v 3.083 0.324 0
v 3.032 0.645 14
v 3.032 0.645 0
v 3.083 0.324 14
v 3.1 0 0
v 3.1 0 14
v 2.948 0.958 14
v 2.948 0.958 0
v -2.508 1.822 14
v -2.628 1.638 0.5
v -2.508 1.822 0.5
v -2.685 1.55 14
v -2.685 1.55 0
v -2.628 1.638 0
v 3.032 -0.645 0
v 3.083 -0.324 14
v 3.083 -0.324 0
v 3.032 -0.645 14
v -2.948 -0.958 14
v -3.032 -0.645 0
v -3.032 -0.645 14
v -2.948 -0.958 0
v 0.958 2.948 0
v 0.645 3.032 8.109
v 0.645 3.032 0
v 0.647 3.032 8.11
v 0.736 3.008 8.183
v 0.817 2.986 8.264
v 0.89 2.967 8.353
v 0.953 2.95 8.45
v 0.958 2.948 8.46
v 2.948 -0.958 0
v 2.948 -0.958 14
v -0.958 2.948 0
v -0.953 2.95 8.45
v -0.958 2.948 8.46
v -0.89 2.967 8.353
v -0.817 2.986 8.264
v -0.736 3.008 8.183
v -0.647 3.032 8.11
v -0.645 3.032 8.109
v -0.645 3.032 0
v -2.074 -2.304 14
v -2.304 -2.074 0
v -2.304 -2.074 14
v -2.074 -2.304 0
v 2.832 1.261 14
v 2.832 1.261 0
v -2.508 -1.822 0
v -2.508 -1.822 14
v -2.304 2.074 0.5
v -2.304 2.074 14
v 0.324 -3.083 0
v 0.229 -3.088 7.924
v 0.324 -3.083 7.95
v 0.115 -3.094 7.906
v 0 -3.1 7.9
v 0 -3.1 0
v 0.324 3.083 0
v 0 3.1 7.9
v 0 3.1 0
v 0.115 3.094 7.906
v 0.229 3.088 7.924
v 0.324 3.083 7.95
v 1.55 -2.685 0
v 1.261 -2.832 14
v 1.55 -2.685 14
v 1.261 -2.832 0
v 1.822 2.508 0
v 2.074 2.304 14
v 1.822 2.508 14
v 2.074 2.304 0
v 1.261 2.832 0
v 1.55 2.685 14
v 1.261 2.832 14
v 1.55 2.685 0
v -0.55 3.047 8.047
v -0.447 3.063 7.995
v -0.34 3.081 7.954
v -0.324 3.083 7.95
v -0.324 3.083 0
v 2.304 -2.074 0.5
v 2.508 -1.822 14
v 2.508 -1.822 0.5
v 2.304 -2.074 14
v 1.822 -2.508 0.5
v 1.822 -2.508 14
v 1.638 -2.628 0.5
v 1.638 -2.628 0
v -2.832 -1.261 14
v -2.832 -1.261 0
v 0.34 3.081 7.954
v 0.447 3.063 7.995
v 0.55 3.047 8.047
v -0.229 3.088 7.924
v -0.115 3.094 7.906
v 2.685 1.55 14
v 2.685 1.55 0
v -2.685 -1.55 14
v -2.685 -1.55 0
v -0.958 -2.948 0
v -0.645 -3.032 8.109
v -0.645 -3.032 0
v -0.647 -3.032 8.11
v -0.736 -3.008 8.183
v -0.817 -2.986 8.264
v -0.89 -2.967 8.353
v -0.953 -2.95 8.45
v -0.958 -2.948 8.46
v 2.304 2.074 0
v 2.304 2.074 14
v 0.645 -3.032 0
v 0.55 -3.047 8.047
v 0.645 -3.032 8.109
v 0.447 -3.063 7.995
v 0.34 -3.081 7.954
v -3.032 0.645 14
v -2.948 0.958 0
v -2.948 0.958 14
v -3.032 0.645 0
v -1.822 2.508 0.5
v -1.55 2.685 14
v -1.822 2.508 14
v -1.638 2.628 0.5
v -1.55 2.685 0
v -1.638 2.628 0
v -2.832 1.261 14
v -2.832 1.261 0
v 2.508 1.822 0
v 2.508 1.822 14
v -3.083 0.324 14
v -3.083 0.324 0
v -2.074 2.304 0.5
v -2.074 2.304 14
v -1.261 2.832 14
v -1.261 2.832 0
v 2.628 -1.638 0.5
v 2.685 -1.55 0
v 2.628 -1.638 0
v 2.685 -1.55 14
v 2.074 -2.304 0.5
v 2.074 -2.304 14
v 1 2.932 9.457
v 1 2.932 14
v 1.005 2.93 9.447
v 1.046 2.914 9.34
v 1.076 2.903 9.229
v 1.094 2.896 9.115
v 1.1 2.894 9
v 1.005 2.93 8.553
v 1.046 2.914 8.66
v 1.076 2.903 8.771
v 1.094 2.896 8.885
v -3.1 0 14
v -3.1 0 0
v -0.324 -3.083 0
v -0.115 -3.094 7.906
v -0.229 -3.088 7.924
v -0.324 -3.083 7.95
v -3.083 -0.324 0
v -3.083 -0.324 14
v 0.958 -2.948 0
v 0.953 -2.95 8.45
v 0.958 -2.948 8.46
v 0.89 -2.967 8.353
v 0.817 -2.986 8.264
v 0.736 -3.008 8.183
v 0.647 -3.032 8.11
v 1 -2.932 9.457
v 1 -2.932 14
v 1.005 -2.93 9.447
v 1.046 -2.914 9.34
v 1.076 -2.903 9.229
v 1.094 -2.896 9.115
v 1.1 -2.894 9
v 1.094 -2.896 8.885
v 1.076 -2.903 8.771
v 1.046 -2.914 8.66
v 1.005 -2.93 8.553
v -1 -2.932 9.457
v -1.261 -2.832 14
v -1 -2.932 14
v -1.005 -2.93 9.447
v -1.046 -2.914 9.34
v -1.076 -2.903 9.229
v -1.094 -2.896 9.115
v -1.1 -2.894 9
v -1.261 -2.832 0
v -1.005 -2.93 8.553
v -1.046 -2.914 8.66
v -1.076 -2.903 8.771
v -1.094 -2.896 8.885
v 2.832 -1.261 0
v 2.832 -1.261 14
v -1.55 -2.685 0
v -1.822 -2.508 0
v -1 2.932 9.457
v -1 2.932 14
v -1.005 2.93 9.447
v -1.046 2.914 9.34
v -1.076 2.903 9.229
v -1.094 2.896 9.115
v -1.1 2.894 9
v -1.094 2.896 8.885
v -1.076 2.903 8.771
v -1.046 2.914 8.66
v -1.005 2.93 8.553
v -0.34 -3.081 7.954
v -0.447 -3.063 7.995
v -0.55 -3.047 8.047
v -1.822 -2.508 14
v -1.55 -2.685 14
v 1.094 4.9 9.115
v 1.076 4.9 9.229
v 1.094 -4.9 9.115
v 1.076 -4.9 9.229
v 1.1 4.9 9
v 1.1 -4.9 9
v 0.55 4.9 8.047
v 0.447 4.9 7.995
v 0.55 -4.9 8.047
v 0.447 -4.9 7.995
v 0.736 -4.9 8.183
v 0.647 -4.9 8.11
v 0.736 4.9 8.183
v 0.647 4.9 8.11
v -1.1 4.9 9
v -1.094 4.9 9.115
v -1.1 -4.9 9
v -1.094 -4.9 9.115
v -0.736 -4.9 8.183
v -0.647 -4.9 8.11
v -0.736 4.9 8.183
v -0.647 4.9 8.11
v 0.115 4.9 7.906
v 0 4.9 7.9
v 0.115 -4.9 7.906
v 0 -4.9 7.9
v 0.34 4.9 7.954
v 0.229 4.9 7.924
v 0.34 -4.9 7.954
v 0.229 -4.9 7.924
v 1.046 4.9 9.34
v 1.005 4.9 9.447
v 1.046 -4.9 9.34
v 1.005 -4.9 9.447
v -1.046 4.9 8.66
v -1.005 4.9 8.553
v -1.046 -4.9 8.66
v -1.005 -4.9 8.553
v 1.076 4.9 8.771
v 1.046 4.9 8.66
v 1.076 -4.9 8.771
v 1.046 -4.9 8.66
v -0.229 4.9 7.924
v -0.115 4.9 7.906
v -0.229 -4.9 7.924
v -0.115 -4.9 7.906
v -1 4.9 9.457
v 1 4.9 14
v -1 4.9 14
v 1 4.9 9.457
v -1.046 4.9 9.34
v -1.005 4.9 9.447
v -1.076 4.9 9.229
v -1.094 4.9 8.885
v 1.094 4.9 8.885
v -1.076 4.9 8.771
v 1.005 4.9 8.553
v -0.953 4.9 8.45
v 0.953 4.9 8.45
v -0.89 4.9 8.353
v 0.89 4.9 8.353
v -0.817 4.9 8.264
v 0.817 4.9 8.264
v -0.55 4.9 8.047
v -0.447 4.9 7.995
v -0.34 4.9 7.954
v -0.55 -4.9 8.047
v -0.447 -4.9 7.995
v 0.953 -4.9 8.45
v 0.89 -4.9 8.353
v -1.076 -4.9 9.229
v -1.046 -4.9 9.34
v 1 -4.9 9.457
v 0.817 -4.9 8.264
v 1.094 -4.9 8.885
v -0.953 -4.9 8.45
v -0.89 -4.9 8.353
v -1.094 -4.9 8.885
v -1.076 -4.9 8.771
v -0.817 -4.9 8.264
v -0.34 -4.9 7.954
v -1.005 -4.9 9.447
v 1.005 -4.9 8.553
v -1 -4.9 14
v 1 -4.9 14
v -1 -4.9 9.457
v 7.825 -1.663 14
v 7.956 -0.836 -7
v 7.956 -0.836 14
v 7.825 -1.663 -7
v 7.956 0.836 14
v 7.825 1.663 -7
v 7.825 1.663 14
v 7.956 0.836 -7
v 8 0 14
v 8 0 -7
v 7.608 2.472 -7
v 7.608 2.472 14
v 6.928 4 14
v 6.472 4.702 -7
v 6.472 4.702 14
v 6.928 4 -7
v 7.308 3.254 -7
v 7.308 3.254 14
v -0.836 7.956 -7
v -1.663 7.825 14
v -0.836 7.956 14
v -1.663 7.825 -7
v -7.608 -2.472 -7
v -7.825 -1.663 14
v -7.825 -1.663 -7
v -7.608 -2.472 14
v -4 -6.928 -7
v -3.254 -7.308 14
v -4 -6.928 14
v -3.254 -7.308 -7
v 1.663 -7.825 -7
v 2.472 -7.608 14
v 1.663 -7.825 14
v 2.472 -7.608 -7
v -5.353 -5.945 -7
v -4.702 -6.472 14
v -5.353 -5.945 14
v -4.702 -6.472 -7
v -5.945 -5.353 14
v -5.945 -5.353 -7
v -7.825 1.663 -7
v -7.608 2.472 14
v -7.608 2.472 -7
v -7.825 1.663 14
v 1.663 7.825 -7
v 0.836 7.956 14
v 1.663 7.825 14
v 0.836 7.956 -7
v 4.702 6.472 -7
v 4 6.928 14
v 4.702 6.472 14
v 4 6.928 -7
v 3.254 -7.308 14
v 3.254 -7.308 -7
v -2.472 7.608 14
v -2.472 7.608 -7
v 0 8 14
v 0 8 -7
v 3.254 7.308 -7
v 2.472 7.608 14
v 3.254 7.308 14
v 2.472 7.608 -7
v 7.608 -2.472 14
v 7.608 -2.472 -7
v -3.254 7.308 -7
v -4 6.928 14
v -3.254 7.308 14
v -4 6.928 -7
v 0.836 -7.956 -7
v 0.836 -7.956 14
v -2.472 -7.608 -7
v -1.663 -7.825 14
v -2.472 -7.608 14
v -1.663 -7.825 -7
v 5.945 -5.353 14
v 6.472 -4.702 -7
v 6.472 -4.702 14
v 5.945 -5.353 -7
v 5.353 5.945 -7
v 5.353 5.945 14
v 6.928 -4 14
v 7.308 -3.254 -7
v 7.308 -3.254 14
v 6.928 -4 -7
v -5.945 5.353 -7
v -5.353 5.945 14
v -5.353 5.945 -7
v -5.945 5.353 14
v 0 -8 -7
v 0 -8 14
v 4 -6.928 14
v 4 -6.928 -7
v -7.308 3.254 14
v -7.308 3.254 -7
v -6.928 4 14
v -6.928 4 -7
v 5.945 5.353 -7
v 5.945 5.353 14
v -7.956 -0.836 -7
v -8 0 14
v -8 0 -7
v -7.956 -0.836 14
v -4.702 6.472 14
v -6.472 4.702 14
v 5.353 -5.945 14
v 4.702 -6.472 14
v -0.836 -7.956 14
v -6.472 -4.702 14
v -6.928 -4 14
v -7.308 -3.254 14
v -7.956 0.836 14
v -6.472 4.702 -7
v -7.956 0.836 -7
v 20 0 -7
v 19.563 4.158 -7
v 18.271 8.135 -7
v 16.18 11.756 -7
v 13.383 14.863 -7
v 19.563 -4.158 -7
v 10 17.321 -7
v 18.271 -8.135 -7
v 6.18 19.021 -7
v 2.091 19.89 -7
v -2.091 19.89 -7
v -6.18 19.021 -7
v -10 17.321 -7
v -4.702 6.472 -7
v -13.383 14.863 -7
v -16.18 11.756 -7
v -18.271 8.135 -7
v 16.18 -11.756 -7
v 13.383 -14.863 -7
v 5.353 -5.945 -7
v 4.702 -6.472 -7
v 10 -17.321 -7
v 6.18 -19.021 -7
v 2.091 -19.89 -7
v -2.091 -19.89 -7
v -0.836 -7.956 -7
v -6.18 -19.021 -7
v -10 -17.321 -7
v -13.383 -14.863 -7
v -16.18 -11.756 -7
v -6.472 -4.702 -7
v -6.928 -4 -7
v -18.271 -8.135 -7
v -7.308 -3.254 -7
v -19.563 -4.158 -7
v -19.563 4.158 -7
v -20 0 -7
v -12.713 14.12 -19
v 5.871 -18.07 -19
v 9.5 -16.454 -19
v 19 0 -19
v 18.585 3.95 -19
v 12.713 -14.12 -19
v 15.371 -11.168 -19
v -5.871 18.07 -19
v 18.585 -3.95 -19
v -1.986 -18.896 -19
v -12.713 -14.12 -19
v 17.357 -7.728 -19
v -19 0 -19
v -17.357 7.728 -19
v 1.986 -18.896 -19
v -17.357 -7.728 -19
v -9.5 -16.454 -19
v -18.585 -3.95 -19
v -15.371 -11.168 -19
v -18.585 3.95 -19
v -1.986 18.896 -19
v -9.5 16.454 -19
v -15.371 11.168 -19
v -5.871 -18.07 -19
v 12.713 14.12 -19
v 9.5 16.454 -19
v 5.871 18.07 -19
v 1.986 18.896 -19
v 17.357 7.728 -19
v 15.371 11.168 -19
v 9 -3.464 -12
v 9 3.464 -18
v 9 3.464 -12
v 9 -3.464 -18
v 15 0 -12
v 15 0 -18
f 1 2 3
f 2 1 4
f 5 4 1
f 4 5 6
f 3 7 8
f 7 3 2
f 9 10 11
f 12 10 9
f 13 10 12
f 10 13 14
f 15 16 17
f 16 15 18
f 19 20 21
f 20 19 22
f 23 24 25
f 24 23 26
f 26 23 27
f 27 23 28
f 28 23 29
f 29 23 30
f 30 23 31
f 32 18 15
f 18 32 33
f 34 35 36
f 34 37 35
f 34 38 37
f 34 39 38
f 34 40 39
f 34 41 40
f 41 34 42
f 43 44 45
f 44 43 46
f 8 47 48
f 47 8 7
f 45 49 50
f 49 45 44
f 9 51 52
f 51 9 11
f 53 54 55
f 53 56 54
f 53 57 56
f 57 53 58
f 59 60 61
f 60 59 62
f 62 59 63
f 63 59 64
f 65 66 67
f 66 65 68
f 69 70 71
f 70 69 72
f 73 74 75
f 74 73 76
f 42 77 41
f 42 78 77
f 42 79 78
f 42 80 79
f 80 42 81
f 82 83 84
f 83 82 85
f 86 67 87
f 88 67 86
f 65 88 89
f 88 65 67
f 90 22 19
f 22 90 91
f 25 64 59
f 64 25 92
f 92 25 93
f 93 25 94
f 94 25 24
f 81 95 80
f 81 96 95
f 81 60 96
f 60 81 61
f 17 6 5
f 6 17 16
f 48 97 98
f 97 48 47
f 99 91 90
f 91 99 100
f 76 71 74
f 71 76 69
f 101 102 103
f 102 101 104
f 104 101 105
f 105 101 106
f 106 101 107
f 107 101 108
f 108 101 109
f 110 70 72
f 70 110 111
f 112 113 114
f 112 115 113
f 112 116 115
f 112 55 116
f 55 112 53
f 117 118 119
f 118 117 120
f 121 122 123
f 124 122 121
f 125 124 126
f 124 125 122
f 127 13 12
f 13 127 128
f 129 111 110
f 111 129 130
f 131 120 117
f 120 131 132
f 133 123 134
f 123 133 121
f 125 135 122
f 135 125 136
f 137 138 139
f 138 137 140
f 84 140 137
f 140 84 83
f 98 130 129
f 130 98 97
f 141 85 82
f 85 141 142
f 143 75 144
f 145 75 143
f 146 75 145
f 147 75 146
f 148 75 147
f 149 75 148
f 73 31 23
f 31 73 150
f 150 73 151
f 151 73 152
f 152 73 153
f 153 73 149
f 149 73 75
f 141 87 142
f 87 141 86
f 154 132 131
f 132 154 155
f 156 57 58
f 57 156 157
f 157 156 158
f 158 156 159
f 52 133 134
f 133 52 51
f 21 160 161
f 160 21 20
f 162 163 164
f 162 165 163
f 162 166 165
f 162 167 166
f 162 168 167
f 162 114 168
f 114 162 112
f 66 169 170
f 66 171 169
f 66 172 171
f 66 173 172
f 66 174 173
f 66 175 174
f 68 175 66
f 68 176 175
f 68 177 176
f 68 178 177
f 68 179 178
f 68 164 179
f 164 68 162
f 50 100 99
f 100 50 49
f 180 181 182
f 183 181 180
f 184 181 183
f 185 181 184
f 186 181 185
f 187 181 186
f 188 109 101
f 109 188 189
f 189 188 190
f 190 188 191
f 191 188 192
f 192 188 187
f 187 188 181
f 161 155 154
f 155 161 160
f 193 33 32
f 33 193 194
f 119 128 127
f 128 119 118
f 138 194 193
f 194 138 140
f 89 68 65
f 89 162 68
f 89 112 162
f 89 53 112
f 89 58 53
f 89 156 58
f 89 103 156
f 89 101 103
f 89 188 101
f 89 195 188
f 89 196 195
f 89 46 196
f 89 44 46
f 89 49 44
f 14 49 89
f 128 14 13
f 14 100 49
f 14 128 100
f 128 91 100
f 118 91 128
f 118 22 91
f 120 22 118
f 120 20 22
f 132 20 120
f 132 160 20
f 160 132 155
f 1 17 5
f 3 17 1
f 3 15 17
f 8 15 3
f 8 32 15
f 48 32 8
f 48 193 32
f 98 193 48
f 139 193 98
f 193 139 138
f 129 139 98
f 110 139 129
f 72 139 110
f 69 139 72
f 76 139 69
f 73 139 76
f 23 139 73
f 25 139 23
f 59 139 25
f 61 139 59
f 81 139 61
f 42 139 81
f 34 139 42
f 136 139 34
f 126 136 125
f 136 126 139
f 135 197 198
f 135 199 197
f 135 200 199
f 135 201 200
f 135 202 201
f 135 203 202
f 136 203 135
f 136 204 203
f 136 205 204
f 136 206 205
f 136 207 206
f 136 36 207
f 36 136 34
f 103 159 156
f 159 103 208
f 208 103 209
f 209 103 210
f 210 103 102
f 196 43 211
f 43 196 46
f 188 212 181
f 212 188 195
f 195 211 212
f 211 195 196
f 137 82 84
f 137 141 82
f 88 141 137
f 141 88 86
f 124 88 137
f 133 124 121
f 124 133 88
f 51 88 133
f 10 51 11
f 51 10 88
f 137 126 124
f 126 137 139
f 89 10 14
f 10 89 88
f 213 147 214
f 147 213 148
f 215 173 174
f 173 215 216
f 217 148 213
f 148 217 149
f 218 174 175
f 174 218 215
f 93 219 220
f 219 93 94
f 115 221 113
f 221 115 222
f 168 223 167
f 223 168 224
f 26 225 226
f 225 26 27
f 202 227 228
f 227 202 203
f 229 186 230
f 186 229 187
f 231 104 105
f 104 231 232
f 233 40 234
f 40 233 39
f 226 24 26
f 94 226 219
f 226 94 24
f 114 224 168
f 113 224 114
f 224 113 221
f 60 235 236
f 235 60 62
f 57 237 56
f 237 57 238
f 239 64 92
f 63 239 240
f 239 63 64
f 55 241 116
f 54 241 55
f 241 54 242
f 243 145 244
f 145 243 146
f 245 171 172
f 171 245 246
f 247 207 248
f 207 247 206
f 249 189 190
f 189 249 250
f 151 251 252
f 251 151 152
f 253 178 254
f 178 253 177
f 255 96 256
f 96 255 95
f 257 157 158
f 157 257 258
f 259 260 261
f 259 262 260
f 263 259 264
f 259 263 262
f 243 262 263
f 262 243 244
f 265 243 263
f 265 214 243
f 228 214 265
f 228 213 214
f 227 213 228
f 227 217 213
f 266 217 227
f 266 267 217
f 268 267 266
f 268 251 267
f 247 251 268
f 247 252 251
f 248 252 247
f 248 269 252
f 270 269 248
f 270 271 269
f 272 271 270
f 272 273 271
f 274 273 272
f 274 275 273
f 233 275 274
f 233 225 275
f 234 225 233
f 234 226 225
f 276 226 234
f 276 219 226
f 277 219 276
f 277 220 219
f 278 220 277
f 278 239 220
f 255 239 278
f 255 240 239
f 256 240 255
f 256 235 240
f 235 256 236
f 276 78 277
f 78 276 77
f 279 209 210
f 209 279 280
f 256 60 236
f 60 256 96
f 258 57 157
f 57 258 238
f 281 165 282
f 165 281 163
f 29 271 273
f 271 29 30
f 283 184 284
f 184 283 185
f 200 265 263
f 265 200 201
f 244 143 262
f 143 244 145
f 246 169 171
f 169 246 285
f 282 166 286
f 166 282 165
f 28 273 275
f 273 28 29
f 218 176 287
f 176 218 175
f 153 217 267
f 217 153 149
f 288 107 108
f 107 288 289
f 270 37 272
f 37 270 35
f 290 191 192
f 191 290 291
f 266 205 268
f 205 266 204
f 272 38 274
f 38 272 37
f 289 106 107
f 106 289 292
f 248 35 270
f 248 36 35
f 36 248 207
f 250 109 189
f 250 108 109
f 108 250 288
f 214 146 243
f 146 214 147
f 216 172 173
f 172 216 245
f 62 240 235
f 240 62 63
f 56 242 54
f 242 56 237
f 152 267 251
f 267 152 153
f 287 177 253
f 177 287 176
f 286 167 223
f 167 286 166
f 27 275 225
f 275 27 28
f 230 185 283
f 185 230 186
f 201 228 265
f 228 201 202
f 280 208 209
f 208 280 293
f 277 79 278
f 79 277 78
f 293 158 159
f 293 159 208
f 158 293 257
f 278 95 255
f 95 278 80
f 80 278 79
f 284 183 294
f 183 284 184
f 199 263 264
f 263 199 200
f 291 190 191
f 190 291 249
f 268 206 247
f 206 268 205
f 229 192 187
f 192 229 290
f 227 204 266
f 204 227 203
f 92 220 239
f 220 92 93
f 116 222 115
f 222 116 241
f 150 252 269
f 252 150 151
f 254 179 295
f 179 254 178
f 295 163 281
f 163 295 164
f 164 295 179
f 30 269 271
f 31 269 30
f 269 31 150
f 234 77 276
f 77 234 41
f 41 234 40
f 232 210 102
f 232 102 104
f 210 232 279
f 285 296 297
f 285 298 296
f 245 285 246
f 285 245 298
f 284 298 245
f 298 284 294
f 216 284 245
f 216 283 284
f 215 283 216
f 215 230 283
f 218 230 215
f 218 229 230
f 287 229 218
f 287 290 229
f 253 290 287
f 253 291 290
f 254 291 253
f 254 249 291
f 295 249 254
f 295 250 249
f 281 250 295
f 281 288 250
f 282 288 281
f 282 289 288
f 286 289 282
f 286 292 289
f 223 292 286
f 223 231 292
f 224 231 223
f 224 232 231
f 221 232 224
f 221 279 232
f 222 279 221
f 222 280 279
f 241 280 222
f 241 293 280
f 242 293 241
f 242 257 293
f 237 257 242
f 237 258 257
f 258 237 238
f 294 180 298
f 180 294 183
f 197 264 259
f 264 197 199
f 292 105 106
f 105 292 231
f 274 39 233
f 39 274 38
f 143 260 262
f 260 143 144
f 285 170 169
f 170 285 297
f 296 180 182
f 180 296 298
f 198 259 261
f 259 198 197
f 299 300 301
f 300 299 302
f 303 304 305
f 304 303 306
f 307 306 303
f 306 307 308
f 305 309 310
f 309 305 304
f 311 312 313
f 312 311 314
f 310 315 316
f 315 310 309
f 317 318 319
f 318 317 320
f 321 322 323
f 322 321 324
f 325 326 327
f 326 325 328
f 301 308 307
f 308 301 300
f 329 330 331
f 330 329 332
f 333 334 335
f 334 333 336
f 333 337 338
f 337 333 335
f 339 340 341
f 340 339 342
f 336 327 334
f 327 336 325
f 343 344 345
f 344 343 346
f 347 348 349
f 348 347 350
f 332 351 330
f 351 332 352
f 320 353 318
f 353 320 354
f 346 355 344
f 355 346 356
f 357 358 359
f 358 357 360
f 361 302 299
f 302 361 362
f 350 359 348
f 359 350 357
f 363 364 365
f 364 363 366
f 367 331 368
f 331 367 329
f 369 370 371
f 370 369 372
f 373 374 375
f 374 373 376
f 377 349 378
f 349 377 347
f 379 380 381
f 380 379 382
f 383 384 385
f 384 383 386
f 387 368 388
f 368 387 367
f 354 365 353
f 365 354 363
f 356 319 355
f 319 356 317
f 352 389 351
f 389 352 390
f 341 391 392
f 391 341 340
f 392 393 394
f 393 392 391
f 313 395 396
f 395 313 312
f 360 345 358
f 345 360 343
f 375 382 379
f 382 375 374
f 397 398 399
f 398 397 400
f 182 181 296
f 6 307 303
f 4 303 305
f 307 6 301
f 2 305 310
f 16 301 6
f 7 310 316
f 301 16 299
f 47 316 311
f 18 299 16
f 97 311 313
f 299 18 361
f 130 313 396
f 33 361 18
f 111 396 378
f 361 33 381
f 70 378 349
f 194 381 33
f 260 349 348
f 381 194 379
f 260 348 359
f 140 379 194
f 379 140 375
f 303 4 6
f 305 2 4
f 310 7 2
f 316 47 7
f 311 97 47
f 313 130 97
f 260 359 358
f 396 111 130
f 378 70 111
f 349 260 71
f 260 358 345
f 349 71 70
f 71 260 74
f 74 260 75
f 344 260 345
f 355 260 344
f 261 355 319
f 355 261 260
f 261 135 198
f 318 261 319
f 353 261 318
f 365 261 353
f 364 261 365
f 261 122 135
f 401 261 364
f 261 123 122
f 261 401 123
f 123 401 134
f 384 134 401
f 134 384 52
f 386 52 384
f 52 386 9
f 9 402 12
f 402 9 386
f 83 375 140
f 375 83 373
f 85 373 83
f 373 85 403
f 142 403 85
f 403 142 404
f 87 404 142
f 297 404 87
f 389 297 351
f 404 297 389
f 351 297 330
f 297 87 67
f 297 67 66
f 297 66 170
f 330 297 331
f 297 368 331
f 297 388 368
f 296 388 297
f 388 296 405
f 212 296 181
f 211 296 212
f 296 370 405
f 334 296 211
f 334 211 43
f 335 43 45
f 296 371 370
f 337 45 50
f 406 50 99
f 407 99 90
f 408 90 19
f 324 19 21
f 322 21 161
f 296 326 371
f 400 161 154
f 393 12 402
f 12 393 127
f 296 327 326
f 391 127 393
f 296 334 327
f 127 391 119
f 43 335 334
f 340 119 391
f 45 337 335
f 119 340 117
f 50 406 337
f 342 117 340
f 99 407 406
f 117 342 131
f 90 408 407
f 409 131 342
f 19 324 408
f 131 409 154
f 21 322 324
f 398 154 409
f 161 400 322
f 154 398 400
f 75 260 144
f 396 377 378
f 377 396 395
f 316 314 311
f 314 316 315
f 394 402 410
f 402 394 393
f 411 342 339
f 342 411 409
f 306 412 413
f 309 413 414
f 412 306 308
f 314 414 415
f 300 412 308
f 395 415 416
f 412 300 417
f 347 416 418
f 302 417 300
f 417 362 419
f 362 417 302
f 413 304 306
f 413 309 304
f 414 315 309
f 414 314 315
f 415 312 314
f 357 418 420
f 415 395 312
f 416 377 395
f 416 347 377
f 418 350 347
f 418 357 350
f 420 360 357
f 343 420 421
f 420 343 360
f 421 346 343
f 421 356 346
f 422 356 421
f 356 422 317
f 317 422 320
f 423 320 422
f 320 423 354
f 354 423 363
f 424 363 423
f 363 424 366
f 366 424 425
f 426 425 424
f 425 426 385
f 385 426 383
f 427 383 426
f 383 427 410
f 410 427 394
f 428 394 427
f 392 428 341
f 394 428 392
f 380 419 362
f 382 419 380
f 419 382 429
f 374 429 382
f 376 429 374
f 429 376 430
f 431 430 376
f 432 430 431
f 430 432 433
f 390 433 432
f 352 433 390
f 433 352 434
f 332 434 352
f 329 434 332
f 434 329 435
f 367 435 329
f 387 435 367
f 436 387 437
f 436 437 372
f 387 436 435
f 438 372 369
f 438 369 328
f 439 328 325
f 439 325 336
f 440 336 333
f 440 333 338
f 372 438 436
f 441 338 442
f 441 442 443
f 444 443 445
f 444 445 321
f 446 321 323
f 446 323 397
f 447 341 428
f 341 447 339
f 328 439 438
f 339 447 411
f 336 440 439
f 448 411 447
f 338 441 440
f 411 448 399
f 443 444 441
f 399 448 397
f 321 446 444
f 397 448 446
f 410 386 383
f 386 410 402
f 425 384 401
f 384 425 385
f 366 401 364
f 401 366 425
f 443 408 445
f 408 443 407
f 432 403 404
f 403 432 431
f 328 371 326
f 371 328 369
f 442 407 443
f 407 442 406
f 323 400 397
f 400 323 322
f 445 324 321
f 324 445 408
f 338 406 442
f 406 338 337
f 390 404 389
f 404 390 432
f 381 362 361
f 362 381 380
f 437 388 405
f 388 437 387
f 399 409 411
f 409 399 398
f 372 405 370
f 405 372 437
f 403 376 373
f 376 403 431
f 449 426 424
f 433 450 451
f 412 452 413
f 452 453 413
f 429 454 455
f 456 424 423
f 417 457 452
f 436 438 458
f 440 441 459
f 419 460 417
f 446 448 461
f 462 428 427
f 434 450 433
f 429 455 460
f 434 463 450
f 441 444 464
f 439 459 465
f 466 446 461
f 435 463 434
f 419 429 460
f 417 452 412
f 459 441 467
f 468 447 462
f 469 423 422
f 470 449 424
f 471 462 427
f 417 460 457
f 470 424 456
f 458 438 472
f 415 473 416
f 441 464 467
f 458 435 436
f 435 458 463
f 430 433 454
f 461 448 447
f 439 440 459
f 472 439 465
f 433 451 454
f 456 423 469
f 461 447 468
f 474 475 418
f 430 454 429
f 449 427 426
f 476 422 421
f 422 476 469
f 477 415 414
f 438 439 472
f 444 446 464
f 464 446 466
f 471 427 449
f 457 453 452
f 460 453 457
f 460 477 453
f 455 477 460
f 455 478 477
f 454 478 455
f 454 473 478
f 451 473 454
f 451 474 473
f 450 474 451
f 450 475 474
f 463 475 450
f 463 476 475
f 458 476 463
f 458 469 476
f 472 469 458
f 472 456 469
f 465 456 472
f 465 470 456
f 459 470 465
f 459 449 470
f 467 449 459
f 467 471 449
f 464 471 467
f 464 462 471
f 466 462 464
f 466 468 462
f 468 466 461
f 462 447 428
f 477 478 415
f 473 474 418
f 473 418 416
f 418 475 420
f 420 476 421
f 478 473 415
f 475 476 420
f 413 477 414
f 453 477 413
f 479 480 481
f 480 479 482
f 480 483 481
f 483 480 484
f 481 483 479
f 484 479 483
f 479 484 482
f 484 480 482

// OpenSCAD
    $fn=60;
    overshoot = 0.1;

    mount_radius =   3.0;
    mount_depth  =  14.0;
    slot_width   =   1.4;
    slot_depth   =   0.5;
    
    cross_bar_length = 9.8; 
    cross_bar_radius = 1.0; 
    cross_bar_depth =  9.0;
    
    knob_skirt_outer = 20; knob_skirt_inner = 19; skirt_height = 12;
    knob_skirt_outer_depth = 3;
    
    flange_width = 12; flange_length = knob_skirt_outer*2; flange_depth = 32;
    flange_edge_radius = 4;
    
    sleeve_radius = 8;
    sleeve_depth  = mount_depth + 4;
    
    key_size = 6;

module mount() {
    difference() {
        cylinder(mount_depth+overshoot, r=(mount_radius+overshoot));
        rotate([0,0,-45])
        translate([-(mount_radius + overshoot), -slot_width/2, -overshoot]) {
            cube([((mount_radius+overshoot) * 2), slot_width, slot_depth+overshoot]); 
        }
    }

    translate([0, cross_bar_length/2, cross_bar_depth]) 
        rotate([90, 0, 0]) {
            cylinder(cross_bar_length, r=(cross_bar_radius+overshoot));
            translate([-cross_bar_radius, 0, 0]) {
                cube([2*cross_bar_radius, mount_depth + 2 * overshoot - cross_bar_depth, cross_bar_length]);
            }
    }
}

module sleeve() {
    color("red")
    translate([0, 0, -7])
    cylinder(sleeve_depth+3, r=sleeve_radius);
}

module simple_knob() {
    color("blue") {
        cylinder(skirt_height, r1=knob_skirt_inner, r2=knob_skirt_outer, $fn=30);
    }
}


//mount();
//
difference() {
    sleeve();
    mount();
}
difference() {
    translate([0,0,-mount_depth-5]) {
        simple_knob();
    }
    translate([knob_skirt_outer - 9,0,-18]) {
         color("yellow") {
             rotate([0,0,0]) {
                cylinder(6, r=4, $fn=3);
             }
         }
     }
 }
//translate([0, 0, mount_depth]) {
//    knob();
//}
